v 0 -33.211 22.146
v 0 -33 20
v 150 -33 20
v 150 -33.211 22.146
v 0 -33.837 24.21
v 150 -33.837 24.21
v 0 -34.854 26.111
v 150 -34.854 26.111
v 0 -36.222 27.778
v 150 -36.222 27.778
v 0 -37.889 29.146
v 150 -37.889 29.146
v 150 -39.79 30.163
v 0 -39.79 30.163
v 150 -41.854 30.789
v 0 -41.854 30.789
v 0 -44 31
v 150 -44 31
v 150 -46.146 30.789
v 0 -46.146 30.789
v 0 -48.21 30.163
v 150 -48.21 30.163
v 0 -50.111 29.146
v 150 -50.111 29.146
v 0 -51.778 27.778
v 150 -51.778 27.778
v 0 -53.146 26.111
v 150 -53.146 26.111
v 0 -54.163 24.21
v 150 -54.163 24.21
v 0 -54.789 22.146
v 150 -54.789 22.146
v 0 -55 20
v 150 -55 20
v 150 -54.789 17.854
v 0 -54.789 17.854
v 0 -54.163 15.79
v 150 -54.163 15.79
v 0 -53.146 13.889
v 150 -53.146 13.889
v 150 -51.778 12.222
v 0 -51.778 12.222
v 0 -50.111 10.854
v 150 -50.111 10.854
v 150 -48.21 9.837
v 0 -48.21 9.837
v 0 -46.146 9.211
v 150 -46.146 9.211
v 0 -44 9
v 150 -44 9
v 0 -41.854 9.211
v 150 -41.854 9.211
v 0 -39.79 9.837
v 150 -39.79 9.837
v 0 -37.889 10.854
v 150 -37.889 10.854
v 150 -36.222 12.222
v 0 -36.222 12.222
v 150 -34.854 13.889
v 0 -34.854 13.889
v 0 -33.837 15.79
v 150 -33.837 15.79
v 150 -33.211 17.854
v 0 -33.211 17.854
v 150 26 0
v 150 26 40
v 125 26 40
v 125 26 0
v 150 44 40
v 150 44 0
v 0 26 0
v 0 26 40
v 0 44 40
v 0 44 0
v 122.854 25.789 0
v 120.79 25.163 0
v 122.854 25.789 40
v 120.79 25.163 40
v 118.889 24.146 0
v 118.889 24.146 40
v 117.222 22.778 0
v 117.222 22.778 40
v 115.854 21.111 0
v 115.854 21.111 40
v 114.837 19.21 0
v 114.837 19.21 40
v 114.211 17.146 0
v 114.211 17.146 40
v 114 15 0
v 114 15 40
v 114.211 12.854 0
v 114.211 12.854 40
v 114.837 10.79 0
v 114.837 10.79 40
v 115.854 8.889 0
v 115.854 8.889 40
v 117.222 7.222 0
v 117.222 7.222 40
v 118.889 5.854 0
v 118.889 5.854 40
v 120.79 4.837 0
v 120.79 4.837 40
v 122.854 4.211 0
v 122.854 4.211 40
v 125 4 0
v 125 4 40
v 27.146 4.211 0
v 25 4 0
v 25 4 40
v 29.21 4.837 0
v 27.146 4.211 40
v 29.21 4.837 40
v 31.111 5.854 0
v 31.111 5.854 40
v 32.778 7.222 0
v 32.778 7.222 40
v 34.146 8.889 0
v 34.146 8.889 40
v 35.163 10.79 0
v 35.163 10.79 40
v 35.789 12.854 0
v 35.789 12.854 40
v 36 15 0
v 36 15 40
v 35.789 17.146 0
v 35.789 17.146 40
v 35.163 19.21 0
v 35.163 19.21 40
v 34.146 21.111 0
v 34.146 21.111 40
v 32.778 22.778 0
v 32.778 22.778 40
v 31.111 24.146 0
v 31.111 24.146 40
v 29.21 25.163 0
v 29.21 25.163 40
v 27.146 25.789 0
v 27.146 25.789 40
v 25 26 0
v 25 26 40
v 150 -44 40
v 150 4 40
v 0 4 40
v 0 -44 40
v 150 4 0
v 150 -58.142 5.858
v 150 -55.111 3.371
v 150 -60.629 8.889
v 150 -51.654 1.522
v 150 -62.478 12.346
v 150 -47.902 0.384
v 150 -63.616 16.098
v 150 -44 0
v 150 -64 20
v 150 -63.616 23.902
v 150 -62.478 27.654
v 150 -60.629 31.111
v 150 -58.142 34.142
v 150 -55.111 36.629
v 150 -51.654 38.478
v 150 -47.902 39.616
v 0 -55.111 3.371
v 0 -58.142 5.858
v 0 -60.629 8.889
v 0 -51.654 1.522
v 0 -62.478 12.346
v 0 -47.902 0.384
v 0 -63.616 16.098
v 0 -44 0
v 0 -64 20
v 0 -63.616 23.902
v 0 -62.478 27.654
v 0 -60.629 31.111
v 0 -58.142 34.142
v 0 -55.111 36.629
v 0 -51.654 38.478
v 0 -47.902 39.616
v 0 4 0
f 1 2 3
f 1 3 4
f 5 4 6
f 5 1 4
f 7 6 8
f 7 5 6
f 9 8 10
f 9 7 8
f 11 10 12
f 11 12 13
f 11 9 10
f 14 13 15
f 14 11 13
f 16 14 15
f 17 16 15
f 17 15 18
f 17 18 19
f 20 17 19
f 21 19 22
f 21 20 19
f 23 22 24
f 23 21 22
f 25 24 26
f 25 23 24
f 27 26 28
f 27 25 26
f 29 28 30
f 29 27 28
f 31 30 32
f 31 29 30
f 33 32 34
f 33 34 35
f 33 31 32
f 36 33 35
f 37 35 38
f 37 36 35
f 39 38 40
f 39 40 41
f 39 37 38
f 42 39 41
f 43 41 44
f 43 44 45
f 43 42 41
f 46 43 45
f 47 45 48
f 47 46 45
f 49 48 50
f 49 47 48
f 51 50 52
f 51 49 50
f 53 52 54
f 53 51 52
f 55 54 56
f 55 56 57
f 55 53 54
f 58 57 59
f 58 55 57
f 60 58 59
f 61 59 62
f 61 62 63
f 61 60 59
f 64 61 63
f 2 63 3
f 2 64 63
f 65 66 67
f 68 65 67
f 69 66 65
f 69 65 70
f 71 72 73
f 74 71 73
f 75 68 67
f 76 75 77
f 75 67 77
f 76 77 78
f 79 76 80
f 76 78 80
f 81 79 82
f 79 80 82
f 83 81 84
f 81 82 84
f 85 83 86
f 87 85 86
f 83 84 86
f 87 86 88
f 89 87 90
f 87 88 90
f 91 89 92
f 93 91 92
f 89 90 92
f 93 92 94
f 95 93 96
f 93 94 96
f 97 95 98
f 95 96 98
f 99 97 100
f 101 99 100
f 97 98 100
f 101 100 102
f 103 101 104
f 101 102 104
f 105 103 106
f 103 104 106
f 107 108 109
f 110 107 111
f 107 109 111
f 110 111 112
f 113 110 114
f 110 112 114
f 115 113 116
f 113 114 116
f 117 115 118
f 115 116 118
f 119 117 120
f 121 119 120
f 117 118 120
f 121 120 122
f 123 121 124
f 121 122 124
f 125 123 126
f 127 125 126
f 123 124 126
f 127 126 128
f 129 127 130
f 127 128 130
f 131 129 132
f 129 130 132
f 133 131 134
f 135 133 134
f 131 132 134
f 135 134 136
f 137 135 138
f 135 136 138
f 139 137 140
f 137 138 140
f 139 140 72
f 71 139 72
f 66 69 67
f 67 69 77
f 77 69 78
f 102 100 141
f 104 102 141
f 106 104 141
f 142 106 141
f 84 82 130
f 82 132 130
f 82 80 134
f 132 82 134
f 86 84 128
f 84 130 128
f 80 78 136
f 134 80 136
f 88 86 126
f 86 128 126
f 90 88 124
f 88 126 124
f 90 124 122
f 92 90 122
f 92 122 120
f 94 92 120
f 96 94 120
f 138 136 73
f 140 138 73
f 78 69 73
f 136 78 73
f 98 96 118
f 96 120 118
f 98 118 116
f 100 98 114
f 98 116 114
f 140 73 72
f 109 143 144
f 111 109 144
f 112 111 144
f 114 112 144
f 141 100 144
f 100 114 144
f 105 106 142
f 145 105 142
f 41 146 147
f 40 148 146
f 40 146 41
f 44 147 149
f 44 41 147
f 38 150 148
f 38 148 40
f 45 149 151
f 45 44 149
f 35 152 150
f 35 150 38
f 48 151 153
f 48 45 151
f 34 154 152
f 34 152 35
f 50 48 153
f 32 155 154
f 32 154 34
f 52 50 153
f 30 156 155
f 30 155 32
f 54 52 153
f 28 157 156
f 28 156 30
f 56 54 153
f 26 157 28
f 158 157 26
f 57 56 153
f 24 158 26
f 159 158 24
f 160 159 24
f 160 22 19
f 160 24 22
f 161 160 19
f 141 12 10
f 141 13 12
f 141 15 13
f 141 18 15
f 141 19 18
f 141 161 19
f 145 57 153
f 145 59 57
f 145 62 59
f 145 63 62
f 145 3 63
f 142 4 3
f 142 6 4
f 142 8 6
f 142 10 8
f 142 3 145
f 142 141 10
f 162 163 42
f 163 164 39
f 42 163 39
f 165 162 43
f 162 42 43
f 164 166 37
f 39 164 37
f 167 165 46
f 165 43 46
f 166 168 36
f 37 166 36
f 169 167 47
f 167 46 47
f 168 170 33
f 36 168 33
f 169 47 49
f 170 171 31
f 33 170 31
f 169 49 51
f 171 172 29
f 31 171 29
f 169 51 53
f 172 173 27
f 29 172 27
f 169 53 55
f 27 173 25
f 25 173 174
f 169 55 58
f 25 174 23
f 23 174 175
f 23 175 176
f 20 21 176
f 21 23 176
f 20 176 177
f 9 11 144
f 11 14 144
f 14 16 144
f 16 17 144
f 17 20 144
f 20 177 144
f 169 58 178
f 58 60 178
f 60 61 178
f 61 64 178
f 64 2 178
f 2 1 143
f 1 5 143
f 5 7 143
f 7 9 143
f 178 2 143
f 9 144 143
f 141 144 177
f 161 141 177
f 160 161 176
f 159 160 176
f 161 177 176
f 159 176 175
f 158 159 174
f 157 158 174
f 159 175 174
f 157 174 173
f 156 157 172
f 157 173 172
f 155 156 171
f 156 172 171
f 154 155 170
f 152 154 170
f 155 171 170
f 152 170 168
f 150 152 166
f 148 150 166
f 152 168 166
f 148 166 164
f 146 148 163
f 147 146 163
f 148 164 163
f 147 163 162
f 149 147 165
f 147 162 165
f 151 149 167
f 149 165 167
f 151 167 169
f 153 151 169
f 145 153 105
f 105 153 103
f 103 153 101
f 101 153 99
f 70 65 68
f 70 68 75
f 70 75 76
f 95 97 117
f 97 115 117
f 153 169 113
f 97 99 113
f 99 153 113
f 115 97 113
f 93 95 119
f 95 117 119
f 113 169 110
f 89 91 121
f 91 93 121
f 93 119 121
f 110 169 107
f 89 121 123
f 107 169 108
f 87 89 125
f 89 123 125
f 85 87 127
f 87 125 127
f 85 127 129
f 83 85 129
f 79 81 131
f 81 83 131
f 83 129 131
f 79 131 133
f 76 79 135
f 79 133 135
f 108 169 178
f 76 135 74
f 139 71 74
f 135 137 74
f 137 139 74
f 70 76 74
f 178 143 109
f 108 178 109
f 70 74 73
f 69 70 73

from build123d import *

# Parameters (mm, degrees)
F0_R     = 11
F1_DEPTH = 150
F3_DEPTH = 50


with BuildPart() as f1:
    # F0 (on Right) → F1 (new body)
    with BuildSketch(Plane.YZ):
        with BuildLine():
            Line((44, 40), (-44, 40))
            ThreePointArc((-44, 40), (-64, 20), (-44, 0))
            Line((-44, 0), (44, 0))
            Line((44, 0), (44, 40))
        make_face()
        with Locations((-44, 20)):
            Circle(F0_R, mode=Mode.SUBTRACT)
    extrude(amount=F1_DEPTH)

    # F2 (on face) → F3 (cut)
    with BuildSketch(Plane.XY.offset(40)):
        with BuildLine():
            Line((150, 4), (150, 26))
            Line((150, 26), (125, 26))
            ThreePointArc((125, 26), (114, 15), (125, 4))
            Line((125, 4), (150, 4))
        make_face()
        with BuildLine():
            Line((25, 26), (0, 26))
            Line((0, 26), (0, 4))
            Line((0, 4), (25, 4))
            ThreePointArc((25, 4), (36, 15), (25, 26))
        make_face()
    extrude(amount=-F3_DEPTH, mode=Mode.SUBTRACT)


solid = f1.part
